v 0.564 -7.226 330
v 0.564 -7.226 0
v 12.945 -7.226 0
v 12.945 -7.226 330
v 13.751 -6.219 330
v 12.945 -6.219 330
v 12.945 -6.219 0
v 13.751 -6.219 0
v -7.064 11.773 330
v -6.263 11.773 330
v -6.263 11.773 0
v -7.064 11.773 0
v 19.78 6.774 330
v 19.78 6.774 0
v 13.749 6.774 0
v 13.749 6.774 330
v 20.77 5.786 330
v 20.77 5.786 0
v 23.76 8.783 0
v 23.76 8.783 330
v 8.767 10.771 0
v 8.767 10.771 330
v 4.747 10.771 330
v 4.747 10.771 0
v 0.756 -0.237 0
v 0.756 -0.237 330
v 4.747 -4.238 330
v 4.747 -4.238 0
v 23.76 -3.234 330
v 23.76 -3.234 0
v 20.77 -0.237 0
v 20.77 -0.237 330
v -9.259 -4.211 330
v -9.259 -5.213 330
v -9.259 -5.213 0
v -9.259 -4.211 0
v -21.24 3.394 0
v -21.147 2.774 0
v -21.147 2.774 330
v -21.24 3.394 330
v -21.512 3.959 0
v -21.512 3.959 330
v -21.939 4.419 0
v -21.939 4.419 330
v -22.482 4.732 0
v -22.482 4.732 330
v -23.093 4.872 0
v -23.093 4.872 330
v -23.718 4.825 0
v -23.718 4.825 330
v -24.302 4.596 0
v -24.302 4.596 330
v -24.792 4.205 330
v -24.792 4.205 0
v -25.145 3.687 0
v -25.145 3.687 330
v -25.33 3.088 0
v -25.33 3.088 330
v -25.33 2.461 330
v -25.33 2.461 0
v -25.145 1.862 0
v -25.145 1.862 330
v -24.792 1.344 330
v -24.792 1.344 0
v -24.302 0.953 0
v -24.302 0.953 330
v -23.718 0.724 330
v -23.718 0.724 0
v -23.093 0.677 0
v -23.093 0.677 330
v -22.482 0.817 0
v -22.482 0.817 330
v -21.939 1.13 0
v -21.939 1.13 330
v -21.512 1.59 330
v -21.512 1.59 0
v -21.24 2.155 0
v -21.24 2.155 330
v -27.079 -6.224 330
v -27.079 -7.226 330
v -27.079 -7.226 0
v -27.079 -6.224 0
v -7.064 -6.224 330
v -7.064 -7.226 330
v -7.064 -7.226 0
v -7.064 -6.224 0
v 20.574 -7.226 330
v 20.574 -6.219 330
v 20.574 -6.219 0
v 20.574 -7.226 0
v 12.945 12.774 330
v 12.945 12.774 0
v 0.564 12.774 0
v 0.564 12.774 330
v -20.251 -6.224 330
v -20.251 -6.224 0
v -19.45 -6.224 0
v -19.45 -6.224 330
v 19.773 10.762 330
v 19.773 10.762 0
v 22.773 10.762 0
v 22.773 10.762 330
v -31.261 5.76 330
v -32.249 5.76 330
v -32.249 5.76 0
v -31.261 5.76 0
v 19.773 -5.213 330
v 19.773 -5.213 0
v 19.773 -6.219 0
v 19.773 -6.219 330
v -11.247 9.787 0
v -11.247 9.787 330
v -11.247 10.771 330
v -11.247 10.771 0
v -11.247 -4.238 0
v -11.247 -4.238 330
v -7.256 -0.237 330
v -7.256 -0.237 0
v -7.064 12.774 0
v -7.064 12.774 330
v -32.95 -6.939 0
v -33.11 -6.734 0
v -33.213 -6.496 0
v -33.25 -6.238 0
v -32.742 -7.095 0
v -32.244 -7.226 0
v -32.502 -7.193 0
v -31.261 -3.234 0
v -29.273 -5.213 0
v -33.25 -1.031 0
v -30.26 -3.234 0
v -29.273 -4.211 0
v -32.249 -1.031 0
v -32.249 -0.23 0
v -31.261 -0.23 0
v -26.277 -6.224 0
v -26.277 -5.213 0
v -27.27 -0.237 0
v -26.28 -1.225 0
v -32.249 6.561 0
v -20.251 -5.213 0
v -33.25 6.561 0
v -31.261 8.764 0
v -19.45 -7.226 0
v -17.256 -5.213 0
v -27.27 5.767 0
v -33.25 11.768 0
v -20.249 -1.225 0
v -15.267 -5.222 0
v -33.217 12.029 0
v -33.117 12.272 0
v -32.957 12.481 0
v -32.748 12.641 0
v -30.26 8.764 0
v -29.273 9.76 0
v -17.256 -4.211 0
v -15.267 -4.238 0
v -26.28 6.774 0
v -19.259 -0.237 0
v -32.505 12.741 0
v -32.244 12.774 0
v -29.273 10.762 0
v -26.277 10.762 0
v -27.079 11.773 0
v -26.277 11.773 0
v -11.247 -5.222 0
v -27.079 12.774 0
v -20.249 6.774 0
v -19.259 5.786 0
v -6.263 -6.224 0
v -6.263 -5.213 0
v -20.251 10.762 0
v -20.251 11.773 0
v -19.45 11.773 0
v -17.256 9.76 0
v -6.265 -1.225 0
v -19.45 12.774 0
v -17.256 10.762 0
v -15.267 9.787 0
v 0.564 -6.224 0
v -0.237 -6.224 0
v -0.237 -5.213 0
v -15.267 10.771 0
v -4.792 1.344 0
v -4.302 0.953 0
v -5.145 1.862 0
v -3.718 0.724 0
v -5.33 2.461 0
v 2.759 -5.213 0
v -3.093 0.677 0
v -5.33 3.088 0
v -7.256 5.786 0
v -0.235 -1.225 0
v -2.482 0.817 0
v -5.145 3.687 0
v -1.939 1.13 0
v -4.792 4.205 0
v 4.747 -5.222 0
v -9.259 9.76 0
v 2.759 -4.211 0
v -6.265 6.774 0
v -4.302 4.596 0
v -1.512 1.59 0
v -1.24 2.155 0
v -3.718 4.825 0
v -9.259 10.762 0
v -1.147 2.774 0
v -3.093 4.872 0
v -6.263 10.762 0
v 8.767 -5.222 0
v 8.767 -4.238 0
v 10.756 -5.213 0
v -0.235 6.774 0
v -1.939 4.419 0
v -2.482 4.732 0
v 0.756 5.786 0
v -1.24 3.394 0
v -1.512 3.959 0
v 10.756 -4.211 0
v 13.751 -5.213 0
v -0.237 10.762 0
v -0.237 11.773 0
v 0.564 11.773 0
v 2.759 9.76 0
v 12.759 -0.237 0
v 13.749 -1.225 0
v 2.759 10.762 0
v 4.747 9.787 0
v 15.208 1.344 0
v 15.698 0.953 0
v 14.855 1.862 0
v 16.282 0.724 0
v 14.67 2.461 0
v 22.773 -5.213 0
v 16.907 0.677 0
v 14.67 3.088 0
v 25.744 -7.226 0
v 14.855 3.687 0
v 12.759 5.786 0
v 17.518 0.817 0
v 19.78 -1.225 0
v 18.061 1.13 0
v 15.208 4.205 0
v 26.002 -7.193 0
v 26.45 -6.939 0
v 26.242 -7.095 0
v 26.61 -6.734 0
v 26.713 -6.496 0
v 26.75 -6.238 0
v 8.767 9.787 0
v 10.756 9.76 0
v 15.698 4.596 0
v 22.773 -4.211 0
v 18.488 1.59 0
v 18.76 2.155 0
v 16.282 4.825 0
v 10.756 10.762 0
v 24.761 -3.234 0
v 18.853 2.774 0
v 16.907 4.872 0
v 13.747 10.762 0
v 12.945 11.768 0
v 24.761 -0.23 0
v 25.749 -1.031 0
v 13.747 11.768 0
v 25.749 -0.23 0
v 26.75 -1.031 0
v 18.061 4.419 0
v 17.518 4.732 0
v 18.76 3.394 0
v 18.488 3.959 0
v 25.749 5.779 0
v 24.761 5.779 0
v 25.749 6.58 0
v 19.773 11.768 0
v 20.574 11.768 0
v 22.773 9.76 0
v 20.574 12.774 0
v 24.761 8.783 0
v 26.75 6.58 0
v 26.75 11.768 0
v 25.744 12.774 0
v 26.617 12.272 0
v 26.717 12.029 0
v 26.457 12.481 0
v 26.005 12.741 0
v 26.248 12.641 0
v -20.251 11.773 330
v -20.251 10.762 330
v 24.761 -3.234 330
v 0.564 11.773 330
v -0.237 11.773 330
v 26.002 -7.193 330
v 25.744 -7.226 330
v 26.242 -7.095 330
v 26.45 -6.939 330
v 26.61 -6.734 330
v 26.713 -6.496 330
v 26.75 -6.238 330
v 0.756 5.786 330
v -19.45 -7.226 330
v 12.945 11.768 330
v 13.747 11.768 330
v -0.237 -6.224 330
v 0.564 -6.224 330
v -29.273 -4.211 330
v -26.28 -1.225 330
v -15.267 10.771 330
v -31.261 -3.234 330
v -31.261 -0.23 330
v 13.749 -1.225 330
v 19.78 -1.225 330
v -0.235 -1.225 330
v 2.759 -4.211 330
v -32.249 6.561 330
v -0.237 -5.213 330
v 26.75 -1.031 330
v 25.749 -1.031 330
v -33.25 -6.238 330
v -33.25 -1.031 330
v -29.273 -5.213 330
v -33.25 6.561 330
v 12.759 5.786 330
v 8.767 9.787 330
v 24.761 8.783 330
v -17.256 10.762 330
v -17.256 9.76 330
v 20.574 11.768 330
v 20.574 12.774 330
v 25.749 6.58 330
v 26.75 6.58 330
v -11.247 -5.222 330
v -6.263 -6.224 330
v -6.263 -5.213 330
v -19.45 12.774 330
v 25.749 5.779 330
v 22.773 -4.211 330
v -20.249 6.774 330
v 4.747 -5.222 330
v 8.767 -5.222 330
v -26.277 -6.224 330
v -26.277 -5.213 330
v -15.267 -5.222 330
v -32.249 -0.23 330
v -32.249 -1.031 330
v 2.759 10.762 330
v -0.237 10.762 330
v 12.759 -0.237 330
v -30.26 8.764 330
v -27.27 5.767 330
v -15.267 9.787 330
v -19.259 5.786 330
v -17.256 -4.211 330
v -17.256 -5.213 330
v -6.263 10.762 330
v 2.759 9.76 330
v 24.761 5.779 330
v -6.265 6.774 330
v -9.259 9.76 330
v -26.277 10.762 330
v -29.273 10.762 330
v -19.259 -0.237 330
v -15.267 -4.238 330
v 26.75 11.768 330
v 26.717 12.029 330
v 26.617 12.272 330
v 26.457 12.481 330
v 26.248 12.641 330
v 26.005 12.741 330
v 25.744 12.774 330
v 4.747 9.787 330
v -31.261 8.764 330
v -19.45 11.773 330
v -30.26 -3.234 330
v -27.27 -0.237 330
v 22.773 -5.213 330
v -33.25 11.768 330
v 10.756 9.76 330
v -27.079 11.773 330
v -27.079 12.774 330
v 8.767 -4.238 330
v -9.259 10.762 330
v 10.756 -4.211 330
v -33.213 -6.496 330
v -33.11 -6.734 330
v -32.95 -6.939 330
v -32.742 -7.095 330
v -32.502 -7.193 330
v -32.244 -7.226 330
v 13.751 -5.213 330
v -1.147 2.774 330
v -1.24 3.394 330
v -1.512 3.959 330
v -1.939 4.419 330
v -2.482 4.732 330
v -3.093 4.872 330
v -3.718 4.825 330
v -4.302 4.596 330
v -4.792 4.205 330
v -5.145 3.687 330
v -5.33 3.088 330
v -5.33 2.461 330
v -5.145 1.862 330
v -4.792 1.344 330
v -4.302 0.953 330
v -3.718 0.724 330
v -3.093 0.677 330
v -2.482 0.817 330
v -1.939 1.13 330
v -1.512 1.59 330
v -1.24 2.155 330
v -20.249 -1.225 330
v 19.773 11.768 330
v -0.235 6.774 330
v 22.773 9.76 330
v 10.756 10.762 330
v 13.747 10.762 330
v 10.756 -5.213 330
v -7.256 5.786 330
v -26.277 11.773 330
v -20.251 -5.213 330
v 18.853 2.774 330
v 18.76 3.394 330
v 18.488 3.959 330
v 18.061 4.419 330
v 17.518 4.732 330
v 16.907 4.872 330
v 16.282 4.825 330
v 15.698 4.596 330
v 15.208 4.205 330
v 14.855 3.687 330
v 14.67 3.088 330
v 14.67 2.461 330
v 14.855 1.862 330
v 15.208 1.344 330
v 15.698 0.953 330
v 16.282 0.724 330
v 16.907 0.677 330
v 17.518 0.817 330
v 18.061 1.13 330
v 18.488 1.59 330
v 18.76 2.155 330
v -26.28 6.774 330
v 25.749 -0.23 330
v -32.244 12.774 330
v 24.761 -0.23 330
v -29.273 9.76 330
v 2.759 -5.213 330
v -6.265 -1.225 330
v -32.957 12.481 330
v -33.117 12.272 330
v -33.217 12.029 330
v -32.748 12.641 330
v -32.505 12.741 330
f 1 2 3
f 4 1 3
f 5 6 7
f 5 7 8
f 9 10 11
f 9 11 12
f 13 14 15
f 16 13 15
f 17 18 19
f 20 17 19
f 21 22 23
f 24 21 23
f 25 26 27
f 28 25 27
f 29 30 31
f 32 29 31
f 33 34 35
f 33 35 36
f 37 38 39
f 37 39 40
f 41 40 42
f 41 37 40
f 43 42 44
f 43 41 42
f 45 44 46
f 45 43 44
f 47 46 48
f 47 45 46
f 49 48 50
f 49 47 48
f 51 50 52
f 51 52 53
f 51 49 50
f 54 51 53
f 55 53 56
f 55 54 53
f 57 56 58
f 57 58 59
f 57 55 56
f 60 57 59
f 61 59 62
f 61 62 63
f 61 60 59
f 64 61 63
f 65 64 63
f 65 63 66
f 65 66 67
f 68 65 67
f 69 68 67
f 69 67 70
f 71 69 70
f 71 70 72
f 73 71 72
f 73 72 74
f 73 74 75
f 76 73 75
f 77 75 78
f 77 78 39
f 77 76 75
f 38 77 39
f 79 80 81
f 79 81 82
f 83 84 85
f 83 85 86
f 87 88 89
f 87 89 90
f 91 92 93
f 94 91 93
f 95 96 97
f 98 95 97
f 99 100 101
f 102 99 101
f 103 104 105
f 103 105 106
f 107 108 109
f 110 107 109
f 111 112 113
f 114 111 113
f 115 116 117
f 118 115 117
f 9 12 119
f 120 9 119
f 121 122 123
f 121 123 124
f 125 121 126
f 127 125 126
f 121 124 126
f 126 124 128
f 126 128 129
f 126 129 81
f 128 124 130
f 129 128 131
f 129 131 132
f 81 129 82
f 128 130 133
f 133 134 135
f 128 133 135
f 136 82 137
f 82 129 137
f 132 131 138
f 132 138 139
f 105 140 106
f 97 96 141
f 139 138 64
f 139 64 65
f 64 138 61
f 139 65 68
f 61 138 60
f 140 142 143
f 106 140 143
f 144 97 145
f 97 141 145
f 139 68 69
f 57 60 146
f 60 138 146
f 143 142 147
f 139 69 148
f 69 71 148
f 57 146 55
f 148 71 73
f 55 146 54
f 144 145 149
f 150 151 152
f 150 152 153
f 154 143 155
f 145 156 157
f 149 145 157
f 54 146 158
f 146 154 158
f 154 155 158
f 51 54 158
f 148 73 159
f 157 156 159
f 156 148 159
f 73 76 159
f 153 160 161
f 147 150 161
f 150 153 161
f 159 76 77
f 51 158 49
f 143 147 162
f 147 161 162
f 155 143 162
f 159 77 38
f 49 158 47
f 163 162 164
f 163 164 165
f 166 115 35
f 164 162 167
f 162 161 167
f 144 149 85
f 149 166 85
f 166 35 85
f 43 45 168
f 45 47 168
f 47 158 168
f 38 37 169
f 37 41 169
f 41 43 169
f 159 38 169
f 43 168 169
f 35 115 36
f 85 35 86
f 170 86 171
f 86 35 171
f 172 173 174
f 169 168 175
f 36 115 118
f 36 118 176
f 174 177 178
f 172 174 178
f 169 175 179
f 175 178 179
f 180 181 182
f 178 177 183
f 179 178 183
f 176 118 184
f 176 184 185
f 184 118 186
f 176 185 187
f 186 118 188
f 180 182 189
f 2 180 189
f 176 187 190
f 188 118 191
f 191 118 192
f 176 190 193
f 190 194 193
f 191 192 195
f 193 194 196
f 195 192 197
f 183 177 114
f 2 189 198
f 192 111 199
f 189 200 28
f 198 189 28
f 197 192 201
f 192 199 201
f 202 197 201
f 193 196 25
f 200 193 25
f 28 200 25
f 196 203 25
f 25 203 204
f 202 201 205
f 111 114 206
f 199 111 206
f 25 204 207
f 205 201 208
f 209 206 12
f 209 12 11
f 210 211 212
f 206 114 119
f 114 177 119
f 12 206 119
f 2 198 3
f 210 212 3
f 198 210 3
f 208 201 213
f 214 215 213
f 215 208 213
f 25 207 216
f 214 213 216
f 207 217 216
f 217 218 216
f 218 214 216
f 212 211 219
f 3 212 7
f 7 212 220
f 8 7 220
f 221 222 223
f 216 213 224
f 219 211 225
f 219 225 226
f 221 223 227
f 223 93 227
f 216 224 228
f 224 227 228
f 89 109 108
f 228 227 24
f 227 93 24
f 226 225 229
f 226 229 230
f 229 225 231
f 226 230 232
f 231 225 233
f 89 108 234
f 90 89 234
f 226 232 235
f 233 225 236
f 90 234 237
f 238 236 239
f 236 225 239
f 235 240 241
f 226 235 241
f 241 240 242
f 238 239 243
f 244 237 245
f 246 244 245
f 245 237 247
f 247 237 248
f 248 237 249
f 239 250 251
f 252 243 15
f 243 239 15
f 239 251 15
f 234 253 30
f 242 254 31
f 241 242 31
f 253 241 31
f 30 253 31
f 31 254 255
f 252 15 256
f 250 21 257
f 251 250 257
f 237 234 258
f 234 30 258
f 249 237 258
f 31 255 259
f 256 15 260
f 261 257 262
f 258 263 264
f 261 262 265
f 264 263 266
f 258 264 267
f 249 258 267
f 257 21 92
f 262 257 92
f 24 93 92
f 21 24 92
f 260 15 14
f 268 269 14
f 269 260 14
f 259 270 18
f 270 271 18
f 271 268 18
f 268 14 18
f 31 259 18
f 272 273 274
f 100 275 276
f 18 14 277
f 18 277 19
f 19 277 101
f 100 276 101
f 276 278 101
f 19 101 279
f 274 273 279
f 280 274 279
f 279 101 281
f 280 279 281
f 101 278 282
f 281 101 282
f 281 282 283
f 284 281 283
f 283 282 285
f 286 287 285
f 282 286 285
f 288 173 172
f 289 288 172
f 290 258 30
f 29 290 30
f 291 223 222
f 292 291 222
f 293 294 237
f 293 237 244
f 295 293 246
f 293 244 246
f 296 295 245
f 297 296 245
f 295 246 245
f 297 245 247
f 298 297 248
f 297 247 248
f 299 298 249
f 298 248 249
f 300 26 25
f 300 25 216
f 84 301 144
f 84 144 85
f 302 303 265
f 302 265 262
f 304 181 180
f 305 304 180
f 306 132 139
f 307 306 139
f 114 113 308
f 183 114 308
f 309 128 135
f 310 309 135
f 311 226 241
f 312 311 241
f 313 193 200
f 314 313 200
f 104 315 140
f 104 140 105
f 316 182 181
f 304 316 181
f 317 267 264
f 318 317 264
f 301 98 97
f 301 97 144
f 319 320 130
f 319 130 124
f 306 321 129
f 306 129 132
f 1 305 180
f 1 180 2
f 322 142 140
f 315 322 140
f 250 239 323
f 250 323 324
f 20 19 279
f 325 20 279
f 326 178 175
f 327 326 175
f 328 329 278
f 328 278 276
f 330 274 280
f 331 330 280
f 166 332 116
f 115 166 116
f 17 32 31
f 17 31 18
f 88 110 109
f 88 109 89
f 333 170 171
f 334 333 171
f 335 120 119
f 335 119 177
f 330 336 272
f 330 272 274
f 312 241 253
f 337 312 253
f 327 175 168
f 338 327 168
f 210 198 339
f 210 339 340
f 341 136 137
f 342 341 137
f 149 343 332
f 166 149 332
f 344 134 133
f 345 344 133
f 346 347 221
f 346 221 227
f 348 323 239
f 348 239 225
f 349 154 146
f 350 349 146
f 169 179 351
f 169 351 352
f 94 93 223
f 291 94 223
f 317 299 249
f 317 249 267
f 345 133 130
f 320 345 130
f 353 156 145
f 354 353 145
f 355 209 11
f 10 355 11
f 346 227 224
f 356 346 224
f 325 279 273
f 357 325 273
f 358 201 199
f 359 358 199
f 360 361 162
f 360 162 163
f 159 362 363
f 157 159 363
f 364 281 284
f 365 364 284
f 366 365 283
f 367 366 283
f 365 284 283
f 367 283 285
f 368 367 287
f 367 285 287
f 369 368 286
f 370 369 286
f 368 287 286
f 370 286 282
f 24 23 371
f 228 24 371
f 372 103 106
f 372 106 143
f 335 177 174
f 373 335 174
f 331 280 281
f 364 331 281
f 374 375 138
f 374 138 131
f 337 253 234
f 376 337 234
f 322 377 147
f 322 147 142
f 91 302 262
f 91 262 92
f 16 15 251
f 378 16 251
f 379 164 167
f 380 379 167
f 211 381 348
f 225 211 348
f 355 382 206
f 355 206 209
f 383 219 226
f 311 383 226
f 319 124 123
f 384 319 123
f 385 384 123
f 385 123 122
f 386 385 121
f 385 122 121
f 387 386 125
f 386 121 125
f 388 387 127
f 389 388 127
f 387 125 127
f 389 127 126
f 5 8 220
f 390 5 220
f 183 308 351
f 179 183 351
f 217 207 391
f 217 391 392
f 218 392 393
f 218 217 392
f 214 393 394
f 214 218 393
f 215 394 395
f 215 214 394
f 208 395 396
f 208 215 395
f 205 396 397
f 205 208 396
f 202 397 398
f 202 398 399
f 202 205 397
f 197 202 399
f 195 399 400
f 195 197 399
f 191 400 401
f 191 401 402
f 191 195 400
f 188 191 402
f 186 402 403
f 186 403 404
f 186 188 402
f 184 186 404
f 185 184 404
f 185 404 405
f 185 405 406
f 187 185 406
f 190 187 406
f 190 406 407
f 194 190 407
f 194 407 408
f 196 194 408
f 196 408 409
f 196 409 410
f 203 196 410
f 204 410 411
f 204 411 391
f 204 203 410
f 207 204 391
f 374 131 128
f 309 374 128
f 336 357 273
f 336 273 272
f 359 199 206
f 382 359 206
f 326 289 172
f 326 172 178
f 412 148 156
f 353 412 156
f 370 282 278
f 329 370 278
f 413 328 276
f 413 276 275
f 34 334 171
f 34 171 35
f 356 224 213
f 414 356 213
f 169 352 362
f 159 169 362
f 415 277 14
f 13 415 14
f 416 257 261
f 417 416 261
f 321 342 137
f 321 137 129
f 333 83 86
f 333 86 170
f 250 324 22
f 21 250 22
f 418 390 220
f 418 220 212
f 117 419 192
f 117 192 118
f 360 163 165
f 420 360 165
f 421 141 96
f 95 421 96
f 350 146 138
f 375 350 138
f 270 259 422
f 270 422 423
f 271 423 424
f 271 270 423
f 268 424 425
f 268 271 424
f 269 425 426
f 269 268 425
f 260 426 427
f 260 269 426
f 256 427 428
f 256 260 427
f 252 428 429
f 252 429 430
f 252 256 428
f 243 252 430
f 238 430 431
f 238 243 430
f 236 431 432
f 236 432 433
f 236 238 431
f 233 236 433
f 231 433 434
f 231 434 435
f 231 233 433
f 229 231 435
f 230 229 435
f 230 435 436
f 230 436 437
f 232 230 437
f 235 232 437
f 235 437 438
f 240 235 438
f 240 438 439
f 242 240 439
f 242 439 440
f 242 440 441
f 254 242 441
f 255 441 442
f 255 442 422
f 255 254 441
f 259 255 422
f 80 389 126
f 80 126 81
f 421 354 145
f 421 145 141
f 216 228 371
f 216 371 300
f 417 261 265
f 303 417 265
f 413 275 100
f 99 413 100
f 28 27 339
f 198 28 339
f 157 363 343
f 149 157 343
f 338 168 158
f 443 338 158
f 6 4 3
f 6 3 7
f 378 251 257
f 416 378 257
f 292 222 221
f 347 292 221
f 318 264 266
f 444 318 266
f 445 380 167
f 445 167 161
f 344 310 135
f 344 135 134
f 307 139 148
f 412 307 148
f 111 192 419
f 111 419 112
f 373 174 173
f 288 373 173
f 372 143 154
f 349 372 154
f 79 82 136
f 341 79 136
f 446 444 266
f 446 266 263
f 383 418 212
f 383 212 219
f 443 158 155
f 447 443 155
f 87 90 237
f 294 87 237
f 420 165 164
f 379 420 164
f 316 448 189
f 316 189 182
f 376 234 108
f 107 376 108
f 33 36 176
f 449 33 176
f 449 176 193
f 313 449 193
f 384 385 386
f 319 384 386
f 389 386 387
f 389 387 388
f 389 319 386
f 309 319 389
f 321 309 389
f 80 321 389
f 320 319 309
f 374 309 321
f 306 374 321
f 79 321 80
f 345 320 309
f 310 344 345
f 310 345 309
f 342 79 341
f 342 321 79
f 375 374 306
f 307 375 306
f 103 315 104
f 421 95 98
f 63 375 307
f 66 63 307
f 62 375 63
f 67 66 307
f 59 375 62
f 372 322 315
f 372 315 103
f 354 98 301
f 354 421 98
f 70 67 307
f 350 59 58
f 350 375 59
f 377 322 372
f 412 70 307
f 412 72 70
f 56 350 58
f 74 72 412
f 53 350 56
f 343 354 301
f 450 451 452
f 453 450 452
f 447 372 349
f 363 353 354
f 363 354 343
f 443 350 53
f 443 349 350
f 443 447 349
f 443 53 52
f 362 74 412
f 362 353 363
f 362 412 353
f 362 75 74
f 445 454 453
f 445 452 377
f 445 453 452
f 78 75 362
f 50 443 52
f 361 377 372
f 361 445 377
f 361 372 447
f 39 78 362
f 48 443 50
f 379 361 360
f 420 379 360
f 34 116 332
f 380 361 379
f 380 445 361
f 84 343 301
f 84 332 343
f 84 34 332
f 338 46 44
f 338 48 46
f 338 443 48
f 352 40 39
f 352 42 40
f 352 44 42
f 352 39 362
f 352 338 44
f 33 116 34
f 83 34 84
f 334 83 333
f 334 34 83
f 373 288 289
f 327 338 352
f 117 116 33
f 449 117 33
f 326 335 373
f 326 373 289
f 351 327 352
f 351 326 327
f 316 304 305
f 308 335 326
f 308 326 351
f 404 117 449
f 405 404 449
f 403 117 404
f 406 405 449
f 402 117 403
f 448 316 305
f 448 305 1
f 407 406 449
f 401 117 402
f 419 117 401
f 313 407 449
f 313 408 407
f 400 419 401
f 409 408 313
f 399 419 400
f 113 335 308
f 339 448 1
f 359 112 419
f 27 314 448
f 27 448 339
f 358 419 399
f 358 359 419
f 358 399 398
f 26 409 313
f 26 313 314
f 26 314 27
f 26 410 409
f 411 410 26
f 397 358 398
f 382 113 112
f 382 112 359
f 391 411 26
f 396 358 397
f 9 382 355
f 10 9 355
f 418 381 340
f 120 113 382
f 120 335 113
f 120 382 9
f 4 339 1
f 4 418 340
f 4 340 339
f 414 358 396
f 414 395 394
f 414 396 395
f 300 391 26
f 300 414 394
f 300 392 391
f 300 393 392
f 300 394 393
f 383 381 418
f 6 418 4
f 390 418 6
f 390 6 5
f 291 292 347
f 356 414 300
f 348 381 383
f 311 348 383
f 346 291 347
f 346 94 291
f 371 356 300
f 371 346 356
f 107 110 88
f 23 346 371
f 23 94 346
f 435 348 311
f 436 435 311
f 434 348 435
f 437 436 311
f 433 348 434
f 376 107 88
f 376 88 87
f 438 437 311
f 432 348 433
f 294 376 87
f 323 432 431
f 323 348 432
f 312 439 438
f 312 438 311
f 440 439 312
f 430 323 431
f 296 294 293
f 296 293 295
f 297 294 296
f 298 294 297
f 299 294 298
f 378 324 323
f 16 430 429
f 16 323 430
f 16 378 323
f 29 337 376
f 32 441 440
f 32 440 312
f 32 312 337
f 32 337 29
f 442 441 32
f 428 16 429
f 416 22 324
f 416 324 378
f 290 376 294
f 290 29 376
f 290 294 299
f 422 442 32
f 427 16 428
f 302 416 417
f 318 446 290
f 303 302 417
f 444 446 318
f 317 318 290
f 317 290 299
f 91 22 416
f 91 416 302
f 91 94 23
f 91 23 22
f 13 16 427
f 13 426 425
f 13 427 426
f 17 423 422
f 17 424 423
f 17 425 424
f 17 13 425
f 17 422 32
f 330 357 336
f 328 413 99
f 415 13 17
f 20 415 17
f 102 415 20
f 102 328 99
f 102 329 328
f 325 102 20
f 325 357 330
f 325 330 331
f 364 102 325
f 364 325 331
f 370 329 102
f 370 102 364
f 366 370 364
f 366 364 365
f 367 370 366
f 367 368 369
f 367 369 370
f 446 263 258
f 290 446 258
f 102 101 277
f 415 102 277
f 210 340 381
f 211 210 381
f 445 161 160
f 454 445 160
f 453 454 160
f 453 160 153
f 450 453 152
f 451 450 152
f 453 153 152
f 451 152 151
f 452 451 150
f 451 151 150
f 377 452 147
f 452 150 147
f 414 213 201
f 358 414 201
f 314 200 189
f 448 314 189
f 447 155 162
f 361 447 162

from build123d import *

# Parameters (mm, degrees)
SKETCH_1_R      = 2.103037388
EXTRUDE_1_DEPTH = 330


with BuildPart() as part:
    # 草图1 → 凸台-拉伸1 (new body)
    with BuildSketch(Plane.XY):
        with BuildLine():
            Line((-32.248557314, -0.229845073), (-32.248557314, -1.030984477))
            Line((-32.248557314, -1.030984477), (-33.250003689, -1.030984477))
            Line((-33.250003689, -1.030984477), (-33.250003689, -6.238394755))
            ThreePointArc((-33.250003689, -6.238394755), (-32.949991565, -6.938952391), (-32.24382973, -7.225524788))
            Line((-32.24382973, -7.225524788), (-27.078556151, -7.225524788))
            Line((-27.078556151, -7.225524788), (-27.078556151, -6.224078413))
            Line((-27.078556151, -6.224078413), (-26.277399051, -6.224078413))
            Line((-26.277399051, -6.224078413), (-26.277399051, -5.212715786))
            Line((-26.277399051, -5.212715786), (-29.27300496, -5.212715786))
            Line((-29.27300496, -5.212715786), (-29.27300496, -4.211495229))
            Line((-29.27300496, -4.211495229), (-26.279632969, -1.225390538))
            Line((-26.279632969, -1.225390538), (-20.24902045, -1.225390538))
            Line((-20.24902045, -1.225390538), (-17.255648459, -4.211495229))
            Line((-17.255648459, -4.211495229), (-17.255648459, -5.212715786))
            Line((-17.255648459, -5.212715786), (-20.251254368, -5.212715786))
            Line((-20.251254368, -5.212715786), (-20.251254368, -6.224078413))
            Line((-20.251254368, -6.224078413), (-19.450097268, -6.224078413))
            Line((-19.450097268, -6.224078413), (-19.450097268, -7.225524788))
            Line((-19.450097268, -7.225524788), (-7.064233131, -7.225524788))
            Line((-7.064233131, -7.225524788), (-7.064233131, -6.224078413))
            Line((-7.064233131, -6.224078413), (-6.263076031, -6.224078413))
            Line((-6.263076031, -6.224078413), (-6.263076031, -5.212715786))
            Line((-6.263076031, -5.212715786), (-9.25868194, -5.212715786))
            Line((-9.25868194, -5.212715786), (-9.25868194, -4.211495229))
            Line((-9.25868194, -4.211495229), (-6.265309949, -1.225390538))
            Line((-6.265309949, -1.225390538), (-0.234697429, -1.225390538))
            Line((-0.234697429, -1.225390538), (2.758674561, -4.211495229))
            Line((2.758674561, -4.211495229), (2.758674561, -5.212715786))
            Line((2.758674561, -5.212715786), (-0.236931348, -5.212715786))
            Line((-0.236931348, -5.212715786), (-0.236931348, -6.224078413))
            Line((-0.236931348, -6.224078413), (0.564225752, -6.224078413))
            Line((0.564225752, -6.224078413), (0.564225752, -7.225524788))
            Line((0.564225752, -7.225524788), (12.945482254, -7.225524788))
            Line((12.945482254, -7.225524788), (12.945482254, -6.219120287))
            Line((12.945482254, -6.219120287), (13.751246989, -6.219120287))
            Line((13.751246989, -6.219120287), (13.751246989, -5.212715786))
            Line((13.751246989, -5.212715786), (10.755641081, -5.212715786))
            Line((10.755641081, -5.212715786), (10.755641081, -4.211495229))
            Line((10.755641081, -4.211495229), (13.749013071, -1.225390538))
            Line((13.749013071, -1.225390538), (19.779625591, -1.225390538))
            Line((19.779625591, -1.225390538), (22.772997581, -4.211495229))
            Line((22.772997581, -4.211495229), (22.772997581, -5.212715786))
            Line((22.772997581, -5.212715786), (19.772784037, -5.212715786))
            Line((19.772784037, -5.212715786), (19.772784037, -6.219120287))
            Line((19.772784037, -6.219120287), (20.573941137, -6.219120287))
            Line((20.573941137, -6.219120287), (20.573941137, -7.225524788))
            Line((20.573941137, -7.225524788), (25.743822351, -7.225524788))
            ThreePointArc((25.743822351, -7.225524788), (26.449984187, -6.938952391), (26.749996311, -6.238394755))
            Line((26.749996311, -6.238394755), (26.749996311, -1.030984477))
            Line((26.749996311, -1.030984477), (25.748549936, -1.030984477))
            Line((25.748549936, -1.030984477), (25.748549936, -0.229827377))
            Line((25.748549936, -0.229827377), (24.761302481, -0.229827377))
            Line((24.761302481, -0.229827377), (24.761302481, -3.234203038))
            Line((24.761302481, -3.234203038), (23.759856106, -3.234203038))
            Line((23.759856106, -3.234203038), (20.770104831, -0.237175589))
            Line((20.770104831, -0.237175589), (20.770104831, 5.786126014))
            Line((20.770104831, 5.786126014), (23.759856106, 8.783153462))
            Line((23.759856106, 8.783153462), (24.761302481, 8.783153462))
            Line((24.761302481, 8.783153462), (24.761302481, 5.778777801))
            Line((24.761302481, 5.778777801), (25.748549936, 5.778777801))
            Line((25.748549936, 5.778777801), (25.748549936, 6.579934901))
            Line((25.748549936, 6.579934901), (26.749996311, 6.579934901))
            Line((26.749996311, 6.579934901), (26.749996311, 11.768212512))
            ThreePointArc((26.749996311, 11.768212512), (26.456722319, 12.481138347), (25.743822351, 12.774475212))
            Line((25.743822351, 12.774475212), (20.573941137, 12.774475212))
            Line((20.573941137, 12.774475212), (20.573941137, 11.768070711))
            Line((20.573941137, 11.768070711), (19.772784037, 11.768070711))
            Line((19.772784037, 11.768070711), (19.772784037, 10.761666211))
            Line((19.772784037, 10.761666211), (22.772997581, 10.761666211))
            Line((22.772997581, 10.761666211), (22.772997581, 9.760445653))
            Line((22.772997581, 9.760445653), (19.779625591, 6.774340962))
            Line((19.779625591, 6.774340962), (13.749013071, 6.774340962))
            Line((13.749013071, 6.774340962), (10.755641081, 9.760445653))
            Line((10.755641081, 9.760445653), (10.755641081, 10.761666211))
            Line((10.755641081, 10.761666211), (13.746639354, 10.761666211))
            Line((13.746639354, 10.761666211), (13.746639354, 11.768070711))
            Line((13.746639354, 11.768070711), (12.945482254, 11.768070711))
            Line((12.945482254, 11.768070711), (12.945482254, 12.774475212))
            Line((12.945482254, 12.774475212), (0.564225752, 12.774475212))
            Line((0.564225752, 12.774475212), (0.564225752, 11.773028837))
            Line((0.564225752, 11.773028837), (-0.236931348, 11.773028837))
            Line((-0.236931348, 11.773028837), (-0.236931348, 10.761666211))
            Line((-0.236931348, 10.761666211), (2.758674561, 10.761666211))
            Line((2.758674561, 10.761666211), (2.758674561, 9.760445653))
            Line((2.758674561, 9.760445653), (-0.234697429, 6.774340962))
            Line((-0.234697429, 6.774340962), (-6.265309949, 6.774340962))
            Line((-6.265309949, 6.774340962), (-9.25868194, 9.760445653))
            Line((-9.25868194, 9.760445653), (-9.25868194, 10.761666211))
            Line((-9.25868194, 10.761666211), (-6.263076031, 10.761666211))
            Line((-6.263076031, 10.761666211), (-6.263076031, 11.773028837))
            Line((-6.263076031, 11.773028837), (-7.064233131, 11.773028837))
            Line((-7.064233131, 11.773028837), (-7.064233131, 12.774475212))
            Line((-7.064233131, 12.774475212), (-19.450097268, 12.774475212))
            Line((-19.450097268, 12.774475212), (-19.450097268, 11.773028837))
            Line((-19.450097268, 11.773028837), (-20.251254368, 11.773028837))
            Line((-20.251254368, 11.773028837), (-20.251254368, 10.761666211))
            Line((-20.251254368, 10.761666211), (-17.255648459, 10.761666211))
            Line((-17.255648459, 10.761666211), (-17.255648459, 9.760445653))
            Line((-17.255648459, 9.760445653), (-20.24902045, 6.774340962))
            Line((-20.24902045, 6.774340962), (-26.279632969, 6.774340962))
            Line((-26.279632969, 6.774340962), (-29.27300496, 9.760445653))
            Line((-29.27300496, 9.760445653), (-29.27300496, 10.761666211))
            Line((-29.27300496, 10.761666211), (-26.277399051, 10.761666211))
            Line((-26.277399051, 10.761666211), (-26.277399051, 11.773028837))
            Line((-26.277399051, 11.773028837), (-27.078556151, 11.773028837))
            Line((-27.078556151, 11.773028837), (-27.078556151, 12.774475212))
            Line((-27.078556151, 12.774475212), (-32.24382973, 12.774475212))
            ThreePointArc((-32.24382973, 12.774475212), (-32.956729698, 12.481138347), (-33.250003689, 11.768212512))
            Line((-33.250003689, 11.768212512), (-33.250003689, 6.560802234))
            Line((-33.250003689, 6.560802234), (-32.248557314, 6.560802234))
            Line((-32.248557314, 6.560802234), (-32.248557314, 5.759645134))
            Line((-32.248557314, 5.759645134), (-31.261309859, 5.759645134))
            Line((-31.261309859, 5.759645134), (-31.261309859, 8.764020795))
            Line((-31.261309859, 8.764020795), (-30.259863484, 8.764020795))
            Line((-30.259863484, 8.764020795), (-27.27011221, 5.766993347))
            Line((-27.27011221, 5.766993347), (-27.27011221, -0.237175589))
            Line((-27.27011221, -0.237175589), (-30.259863484, -3.234203038))
            Line((-30.259863484, -3.234203038), (-31.261309859, -3.234203038))
            Line((-31.261309859, -3.234203038), (-31.261309859, -0.229845073))
            Line((-31.261309859, -0.229845073), (-32.248557314, -0.229845073))
        make_face()
        with Locations((-3.250003689, 2.774475212)):
            Circle(SKETCH_1_R, mode=Mode.SUBTRACT)
        with Locations((-23.250003689, 2.774475212)):
            Circle(SKETCH_1_R, mode=Mode.SUBTRACT)
        with Locations((16.749996311, 2.774475212)):
            Circle(SKETCH_1_R, mode=Mode.SUBTRACT)
        Polygon((-19.258541209, 5.786126014), (-19.258541209, -0.237175589), (-15.26734356, -4.238086639), (-15.26734356, -5.22228212), (-11.246986839, -5.22228212), (-11.246986839, -4.238086639), (-7.25578919, -0.237175589), (-7.25578919, 2.774475212), (-7.25578919, 5.786126014), (-11.246986839, 9.787037063), (-11.246986839, 10.771232544), (-15.26734356, 10.771232544), (-15.26734356, 9.787037063), align=None, mode=Mode.SUBTRACT)
        Polygon((4.74697946, -5.22228212), (8.767336181, -5.22228212), (8.767336181, -4.238086639), (12.758533831, -0.237175589), (12.758533831, 2.774475212), (12.758533831, 5.786126014), (8.767336181, 9.787037063), (8.767336181, 10.771232544), (4.74697946, 10.771232544), (4.74697946, 9.787037063), (0.755781811, 5.786126014), (0.755781811, 2.774475212), (0.755781811, -0.237175589), (4.74697946, -4.238086639), align=None, mode=Mode.SUBTRACT)
    extrude(amount=EXTRUDE_1_DEPTH)


solid = part.part
